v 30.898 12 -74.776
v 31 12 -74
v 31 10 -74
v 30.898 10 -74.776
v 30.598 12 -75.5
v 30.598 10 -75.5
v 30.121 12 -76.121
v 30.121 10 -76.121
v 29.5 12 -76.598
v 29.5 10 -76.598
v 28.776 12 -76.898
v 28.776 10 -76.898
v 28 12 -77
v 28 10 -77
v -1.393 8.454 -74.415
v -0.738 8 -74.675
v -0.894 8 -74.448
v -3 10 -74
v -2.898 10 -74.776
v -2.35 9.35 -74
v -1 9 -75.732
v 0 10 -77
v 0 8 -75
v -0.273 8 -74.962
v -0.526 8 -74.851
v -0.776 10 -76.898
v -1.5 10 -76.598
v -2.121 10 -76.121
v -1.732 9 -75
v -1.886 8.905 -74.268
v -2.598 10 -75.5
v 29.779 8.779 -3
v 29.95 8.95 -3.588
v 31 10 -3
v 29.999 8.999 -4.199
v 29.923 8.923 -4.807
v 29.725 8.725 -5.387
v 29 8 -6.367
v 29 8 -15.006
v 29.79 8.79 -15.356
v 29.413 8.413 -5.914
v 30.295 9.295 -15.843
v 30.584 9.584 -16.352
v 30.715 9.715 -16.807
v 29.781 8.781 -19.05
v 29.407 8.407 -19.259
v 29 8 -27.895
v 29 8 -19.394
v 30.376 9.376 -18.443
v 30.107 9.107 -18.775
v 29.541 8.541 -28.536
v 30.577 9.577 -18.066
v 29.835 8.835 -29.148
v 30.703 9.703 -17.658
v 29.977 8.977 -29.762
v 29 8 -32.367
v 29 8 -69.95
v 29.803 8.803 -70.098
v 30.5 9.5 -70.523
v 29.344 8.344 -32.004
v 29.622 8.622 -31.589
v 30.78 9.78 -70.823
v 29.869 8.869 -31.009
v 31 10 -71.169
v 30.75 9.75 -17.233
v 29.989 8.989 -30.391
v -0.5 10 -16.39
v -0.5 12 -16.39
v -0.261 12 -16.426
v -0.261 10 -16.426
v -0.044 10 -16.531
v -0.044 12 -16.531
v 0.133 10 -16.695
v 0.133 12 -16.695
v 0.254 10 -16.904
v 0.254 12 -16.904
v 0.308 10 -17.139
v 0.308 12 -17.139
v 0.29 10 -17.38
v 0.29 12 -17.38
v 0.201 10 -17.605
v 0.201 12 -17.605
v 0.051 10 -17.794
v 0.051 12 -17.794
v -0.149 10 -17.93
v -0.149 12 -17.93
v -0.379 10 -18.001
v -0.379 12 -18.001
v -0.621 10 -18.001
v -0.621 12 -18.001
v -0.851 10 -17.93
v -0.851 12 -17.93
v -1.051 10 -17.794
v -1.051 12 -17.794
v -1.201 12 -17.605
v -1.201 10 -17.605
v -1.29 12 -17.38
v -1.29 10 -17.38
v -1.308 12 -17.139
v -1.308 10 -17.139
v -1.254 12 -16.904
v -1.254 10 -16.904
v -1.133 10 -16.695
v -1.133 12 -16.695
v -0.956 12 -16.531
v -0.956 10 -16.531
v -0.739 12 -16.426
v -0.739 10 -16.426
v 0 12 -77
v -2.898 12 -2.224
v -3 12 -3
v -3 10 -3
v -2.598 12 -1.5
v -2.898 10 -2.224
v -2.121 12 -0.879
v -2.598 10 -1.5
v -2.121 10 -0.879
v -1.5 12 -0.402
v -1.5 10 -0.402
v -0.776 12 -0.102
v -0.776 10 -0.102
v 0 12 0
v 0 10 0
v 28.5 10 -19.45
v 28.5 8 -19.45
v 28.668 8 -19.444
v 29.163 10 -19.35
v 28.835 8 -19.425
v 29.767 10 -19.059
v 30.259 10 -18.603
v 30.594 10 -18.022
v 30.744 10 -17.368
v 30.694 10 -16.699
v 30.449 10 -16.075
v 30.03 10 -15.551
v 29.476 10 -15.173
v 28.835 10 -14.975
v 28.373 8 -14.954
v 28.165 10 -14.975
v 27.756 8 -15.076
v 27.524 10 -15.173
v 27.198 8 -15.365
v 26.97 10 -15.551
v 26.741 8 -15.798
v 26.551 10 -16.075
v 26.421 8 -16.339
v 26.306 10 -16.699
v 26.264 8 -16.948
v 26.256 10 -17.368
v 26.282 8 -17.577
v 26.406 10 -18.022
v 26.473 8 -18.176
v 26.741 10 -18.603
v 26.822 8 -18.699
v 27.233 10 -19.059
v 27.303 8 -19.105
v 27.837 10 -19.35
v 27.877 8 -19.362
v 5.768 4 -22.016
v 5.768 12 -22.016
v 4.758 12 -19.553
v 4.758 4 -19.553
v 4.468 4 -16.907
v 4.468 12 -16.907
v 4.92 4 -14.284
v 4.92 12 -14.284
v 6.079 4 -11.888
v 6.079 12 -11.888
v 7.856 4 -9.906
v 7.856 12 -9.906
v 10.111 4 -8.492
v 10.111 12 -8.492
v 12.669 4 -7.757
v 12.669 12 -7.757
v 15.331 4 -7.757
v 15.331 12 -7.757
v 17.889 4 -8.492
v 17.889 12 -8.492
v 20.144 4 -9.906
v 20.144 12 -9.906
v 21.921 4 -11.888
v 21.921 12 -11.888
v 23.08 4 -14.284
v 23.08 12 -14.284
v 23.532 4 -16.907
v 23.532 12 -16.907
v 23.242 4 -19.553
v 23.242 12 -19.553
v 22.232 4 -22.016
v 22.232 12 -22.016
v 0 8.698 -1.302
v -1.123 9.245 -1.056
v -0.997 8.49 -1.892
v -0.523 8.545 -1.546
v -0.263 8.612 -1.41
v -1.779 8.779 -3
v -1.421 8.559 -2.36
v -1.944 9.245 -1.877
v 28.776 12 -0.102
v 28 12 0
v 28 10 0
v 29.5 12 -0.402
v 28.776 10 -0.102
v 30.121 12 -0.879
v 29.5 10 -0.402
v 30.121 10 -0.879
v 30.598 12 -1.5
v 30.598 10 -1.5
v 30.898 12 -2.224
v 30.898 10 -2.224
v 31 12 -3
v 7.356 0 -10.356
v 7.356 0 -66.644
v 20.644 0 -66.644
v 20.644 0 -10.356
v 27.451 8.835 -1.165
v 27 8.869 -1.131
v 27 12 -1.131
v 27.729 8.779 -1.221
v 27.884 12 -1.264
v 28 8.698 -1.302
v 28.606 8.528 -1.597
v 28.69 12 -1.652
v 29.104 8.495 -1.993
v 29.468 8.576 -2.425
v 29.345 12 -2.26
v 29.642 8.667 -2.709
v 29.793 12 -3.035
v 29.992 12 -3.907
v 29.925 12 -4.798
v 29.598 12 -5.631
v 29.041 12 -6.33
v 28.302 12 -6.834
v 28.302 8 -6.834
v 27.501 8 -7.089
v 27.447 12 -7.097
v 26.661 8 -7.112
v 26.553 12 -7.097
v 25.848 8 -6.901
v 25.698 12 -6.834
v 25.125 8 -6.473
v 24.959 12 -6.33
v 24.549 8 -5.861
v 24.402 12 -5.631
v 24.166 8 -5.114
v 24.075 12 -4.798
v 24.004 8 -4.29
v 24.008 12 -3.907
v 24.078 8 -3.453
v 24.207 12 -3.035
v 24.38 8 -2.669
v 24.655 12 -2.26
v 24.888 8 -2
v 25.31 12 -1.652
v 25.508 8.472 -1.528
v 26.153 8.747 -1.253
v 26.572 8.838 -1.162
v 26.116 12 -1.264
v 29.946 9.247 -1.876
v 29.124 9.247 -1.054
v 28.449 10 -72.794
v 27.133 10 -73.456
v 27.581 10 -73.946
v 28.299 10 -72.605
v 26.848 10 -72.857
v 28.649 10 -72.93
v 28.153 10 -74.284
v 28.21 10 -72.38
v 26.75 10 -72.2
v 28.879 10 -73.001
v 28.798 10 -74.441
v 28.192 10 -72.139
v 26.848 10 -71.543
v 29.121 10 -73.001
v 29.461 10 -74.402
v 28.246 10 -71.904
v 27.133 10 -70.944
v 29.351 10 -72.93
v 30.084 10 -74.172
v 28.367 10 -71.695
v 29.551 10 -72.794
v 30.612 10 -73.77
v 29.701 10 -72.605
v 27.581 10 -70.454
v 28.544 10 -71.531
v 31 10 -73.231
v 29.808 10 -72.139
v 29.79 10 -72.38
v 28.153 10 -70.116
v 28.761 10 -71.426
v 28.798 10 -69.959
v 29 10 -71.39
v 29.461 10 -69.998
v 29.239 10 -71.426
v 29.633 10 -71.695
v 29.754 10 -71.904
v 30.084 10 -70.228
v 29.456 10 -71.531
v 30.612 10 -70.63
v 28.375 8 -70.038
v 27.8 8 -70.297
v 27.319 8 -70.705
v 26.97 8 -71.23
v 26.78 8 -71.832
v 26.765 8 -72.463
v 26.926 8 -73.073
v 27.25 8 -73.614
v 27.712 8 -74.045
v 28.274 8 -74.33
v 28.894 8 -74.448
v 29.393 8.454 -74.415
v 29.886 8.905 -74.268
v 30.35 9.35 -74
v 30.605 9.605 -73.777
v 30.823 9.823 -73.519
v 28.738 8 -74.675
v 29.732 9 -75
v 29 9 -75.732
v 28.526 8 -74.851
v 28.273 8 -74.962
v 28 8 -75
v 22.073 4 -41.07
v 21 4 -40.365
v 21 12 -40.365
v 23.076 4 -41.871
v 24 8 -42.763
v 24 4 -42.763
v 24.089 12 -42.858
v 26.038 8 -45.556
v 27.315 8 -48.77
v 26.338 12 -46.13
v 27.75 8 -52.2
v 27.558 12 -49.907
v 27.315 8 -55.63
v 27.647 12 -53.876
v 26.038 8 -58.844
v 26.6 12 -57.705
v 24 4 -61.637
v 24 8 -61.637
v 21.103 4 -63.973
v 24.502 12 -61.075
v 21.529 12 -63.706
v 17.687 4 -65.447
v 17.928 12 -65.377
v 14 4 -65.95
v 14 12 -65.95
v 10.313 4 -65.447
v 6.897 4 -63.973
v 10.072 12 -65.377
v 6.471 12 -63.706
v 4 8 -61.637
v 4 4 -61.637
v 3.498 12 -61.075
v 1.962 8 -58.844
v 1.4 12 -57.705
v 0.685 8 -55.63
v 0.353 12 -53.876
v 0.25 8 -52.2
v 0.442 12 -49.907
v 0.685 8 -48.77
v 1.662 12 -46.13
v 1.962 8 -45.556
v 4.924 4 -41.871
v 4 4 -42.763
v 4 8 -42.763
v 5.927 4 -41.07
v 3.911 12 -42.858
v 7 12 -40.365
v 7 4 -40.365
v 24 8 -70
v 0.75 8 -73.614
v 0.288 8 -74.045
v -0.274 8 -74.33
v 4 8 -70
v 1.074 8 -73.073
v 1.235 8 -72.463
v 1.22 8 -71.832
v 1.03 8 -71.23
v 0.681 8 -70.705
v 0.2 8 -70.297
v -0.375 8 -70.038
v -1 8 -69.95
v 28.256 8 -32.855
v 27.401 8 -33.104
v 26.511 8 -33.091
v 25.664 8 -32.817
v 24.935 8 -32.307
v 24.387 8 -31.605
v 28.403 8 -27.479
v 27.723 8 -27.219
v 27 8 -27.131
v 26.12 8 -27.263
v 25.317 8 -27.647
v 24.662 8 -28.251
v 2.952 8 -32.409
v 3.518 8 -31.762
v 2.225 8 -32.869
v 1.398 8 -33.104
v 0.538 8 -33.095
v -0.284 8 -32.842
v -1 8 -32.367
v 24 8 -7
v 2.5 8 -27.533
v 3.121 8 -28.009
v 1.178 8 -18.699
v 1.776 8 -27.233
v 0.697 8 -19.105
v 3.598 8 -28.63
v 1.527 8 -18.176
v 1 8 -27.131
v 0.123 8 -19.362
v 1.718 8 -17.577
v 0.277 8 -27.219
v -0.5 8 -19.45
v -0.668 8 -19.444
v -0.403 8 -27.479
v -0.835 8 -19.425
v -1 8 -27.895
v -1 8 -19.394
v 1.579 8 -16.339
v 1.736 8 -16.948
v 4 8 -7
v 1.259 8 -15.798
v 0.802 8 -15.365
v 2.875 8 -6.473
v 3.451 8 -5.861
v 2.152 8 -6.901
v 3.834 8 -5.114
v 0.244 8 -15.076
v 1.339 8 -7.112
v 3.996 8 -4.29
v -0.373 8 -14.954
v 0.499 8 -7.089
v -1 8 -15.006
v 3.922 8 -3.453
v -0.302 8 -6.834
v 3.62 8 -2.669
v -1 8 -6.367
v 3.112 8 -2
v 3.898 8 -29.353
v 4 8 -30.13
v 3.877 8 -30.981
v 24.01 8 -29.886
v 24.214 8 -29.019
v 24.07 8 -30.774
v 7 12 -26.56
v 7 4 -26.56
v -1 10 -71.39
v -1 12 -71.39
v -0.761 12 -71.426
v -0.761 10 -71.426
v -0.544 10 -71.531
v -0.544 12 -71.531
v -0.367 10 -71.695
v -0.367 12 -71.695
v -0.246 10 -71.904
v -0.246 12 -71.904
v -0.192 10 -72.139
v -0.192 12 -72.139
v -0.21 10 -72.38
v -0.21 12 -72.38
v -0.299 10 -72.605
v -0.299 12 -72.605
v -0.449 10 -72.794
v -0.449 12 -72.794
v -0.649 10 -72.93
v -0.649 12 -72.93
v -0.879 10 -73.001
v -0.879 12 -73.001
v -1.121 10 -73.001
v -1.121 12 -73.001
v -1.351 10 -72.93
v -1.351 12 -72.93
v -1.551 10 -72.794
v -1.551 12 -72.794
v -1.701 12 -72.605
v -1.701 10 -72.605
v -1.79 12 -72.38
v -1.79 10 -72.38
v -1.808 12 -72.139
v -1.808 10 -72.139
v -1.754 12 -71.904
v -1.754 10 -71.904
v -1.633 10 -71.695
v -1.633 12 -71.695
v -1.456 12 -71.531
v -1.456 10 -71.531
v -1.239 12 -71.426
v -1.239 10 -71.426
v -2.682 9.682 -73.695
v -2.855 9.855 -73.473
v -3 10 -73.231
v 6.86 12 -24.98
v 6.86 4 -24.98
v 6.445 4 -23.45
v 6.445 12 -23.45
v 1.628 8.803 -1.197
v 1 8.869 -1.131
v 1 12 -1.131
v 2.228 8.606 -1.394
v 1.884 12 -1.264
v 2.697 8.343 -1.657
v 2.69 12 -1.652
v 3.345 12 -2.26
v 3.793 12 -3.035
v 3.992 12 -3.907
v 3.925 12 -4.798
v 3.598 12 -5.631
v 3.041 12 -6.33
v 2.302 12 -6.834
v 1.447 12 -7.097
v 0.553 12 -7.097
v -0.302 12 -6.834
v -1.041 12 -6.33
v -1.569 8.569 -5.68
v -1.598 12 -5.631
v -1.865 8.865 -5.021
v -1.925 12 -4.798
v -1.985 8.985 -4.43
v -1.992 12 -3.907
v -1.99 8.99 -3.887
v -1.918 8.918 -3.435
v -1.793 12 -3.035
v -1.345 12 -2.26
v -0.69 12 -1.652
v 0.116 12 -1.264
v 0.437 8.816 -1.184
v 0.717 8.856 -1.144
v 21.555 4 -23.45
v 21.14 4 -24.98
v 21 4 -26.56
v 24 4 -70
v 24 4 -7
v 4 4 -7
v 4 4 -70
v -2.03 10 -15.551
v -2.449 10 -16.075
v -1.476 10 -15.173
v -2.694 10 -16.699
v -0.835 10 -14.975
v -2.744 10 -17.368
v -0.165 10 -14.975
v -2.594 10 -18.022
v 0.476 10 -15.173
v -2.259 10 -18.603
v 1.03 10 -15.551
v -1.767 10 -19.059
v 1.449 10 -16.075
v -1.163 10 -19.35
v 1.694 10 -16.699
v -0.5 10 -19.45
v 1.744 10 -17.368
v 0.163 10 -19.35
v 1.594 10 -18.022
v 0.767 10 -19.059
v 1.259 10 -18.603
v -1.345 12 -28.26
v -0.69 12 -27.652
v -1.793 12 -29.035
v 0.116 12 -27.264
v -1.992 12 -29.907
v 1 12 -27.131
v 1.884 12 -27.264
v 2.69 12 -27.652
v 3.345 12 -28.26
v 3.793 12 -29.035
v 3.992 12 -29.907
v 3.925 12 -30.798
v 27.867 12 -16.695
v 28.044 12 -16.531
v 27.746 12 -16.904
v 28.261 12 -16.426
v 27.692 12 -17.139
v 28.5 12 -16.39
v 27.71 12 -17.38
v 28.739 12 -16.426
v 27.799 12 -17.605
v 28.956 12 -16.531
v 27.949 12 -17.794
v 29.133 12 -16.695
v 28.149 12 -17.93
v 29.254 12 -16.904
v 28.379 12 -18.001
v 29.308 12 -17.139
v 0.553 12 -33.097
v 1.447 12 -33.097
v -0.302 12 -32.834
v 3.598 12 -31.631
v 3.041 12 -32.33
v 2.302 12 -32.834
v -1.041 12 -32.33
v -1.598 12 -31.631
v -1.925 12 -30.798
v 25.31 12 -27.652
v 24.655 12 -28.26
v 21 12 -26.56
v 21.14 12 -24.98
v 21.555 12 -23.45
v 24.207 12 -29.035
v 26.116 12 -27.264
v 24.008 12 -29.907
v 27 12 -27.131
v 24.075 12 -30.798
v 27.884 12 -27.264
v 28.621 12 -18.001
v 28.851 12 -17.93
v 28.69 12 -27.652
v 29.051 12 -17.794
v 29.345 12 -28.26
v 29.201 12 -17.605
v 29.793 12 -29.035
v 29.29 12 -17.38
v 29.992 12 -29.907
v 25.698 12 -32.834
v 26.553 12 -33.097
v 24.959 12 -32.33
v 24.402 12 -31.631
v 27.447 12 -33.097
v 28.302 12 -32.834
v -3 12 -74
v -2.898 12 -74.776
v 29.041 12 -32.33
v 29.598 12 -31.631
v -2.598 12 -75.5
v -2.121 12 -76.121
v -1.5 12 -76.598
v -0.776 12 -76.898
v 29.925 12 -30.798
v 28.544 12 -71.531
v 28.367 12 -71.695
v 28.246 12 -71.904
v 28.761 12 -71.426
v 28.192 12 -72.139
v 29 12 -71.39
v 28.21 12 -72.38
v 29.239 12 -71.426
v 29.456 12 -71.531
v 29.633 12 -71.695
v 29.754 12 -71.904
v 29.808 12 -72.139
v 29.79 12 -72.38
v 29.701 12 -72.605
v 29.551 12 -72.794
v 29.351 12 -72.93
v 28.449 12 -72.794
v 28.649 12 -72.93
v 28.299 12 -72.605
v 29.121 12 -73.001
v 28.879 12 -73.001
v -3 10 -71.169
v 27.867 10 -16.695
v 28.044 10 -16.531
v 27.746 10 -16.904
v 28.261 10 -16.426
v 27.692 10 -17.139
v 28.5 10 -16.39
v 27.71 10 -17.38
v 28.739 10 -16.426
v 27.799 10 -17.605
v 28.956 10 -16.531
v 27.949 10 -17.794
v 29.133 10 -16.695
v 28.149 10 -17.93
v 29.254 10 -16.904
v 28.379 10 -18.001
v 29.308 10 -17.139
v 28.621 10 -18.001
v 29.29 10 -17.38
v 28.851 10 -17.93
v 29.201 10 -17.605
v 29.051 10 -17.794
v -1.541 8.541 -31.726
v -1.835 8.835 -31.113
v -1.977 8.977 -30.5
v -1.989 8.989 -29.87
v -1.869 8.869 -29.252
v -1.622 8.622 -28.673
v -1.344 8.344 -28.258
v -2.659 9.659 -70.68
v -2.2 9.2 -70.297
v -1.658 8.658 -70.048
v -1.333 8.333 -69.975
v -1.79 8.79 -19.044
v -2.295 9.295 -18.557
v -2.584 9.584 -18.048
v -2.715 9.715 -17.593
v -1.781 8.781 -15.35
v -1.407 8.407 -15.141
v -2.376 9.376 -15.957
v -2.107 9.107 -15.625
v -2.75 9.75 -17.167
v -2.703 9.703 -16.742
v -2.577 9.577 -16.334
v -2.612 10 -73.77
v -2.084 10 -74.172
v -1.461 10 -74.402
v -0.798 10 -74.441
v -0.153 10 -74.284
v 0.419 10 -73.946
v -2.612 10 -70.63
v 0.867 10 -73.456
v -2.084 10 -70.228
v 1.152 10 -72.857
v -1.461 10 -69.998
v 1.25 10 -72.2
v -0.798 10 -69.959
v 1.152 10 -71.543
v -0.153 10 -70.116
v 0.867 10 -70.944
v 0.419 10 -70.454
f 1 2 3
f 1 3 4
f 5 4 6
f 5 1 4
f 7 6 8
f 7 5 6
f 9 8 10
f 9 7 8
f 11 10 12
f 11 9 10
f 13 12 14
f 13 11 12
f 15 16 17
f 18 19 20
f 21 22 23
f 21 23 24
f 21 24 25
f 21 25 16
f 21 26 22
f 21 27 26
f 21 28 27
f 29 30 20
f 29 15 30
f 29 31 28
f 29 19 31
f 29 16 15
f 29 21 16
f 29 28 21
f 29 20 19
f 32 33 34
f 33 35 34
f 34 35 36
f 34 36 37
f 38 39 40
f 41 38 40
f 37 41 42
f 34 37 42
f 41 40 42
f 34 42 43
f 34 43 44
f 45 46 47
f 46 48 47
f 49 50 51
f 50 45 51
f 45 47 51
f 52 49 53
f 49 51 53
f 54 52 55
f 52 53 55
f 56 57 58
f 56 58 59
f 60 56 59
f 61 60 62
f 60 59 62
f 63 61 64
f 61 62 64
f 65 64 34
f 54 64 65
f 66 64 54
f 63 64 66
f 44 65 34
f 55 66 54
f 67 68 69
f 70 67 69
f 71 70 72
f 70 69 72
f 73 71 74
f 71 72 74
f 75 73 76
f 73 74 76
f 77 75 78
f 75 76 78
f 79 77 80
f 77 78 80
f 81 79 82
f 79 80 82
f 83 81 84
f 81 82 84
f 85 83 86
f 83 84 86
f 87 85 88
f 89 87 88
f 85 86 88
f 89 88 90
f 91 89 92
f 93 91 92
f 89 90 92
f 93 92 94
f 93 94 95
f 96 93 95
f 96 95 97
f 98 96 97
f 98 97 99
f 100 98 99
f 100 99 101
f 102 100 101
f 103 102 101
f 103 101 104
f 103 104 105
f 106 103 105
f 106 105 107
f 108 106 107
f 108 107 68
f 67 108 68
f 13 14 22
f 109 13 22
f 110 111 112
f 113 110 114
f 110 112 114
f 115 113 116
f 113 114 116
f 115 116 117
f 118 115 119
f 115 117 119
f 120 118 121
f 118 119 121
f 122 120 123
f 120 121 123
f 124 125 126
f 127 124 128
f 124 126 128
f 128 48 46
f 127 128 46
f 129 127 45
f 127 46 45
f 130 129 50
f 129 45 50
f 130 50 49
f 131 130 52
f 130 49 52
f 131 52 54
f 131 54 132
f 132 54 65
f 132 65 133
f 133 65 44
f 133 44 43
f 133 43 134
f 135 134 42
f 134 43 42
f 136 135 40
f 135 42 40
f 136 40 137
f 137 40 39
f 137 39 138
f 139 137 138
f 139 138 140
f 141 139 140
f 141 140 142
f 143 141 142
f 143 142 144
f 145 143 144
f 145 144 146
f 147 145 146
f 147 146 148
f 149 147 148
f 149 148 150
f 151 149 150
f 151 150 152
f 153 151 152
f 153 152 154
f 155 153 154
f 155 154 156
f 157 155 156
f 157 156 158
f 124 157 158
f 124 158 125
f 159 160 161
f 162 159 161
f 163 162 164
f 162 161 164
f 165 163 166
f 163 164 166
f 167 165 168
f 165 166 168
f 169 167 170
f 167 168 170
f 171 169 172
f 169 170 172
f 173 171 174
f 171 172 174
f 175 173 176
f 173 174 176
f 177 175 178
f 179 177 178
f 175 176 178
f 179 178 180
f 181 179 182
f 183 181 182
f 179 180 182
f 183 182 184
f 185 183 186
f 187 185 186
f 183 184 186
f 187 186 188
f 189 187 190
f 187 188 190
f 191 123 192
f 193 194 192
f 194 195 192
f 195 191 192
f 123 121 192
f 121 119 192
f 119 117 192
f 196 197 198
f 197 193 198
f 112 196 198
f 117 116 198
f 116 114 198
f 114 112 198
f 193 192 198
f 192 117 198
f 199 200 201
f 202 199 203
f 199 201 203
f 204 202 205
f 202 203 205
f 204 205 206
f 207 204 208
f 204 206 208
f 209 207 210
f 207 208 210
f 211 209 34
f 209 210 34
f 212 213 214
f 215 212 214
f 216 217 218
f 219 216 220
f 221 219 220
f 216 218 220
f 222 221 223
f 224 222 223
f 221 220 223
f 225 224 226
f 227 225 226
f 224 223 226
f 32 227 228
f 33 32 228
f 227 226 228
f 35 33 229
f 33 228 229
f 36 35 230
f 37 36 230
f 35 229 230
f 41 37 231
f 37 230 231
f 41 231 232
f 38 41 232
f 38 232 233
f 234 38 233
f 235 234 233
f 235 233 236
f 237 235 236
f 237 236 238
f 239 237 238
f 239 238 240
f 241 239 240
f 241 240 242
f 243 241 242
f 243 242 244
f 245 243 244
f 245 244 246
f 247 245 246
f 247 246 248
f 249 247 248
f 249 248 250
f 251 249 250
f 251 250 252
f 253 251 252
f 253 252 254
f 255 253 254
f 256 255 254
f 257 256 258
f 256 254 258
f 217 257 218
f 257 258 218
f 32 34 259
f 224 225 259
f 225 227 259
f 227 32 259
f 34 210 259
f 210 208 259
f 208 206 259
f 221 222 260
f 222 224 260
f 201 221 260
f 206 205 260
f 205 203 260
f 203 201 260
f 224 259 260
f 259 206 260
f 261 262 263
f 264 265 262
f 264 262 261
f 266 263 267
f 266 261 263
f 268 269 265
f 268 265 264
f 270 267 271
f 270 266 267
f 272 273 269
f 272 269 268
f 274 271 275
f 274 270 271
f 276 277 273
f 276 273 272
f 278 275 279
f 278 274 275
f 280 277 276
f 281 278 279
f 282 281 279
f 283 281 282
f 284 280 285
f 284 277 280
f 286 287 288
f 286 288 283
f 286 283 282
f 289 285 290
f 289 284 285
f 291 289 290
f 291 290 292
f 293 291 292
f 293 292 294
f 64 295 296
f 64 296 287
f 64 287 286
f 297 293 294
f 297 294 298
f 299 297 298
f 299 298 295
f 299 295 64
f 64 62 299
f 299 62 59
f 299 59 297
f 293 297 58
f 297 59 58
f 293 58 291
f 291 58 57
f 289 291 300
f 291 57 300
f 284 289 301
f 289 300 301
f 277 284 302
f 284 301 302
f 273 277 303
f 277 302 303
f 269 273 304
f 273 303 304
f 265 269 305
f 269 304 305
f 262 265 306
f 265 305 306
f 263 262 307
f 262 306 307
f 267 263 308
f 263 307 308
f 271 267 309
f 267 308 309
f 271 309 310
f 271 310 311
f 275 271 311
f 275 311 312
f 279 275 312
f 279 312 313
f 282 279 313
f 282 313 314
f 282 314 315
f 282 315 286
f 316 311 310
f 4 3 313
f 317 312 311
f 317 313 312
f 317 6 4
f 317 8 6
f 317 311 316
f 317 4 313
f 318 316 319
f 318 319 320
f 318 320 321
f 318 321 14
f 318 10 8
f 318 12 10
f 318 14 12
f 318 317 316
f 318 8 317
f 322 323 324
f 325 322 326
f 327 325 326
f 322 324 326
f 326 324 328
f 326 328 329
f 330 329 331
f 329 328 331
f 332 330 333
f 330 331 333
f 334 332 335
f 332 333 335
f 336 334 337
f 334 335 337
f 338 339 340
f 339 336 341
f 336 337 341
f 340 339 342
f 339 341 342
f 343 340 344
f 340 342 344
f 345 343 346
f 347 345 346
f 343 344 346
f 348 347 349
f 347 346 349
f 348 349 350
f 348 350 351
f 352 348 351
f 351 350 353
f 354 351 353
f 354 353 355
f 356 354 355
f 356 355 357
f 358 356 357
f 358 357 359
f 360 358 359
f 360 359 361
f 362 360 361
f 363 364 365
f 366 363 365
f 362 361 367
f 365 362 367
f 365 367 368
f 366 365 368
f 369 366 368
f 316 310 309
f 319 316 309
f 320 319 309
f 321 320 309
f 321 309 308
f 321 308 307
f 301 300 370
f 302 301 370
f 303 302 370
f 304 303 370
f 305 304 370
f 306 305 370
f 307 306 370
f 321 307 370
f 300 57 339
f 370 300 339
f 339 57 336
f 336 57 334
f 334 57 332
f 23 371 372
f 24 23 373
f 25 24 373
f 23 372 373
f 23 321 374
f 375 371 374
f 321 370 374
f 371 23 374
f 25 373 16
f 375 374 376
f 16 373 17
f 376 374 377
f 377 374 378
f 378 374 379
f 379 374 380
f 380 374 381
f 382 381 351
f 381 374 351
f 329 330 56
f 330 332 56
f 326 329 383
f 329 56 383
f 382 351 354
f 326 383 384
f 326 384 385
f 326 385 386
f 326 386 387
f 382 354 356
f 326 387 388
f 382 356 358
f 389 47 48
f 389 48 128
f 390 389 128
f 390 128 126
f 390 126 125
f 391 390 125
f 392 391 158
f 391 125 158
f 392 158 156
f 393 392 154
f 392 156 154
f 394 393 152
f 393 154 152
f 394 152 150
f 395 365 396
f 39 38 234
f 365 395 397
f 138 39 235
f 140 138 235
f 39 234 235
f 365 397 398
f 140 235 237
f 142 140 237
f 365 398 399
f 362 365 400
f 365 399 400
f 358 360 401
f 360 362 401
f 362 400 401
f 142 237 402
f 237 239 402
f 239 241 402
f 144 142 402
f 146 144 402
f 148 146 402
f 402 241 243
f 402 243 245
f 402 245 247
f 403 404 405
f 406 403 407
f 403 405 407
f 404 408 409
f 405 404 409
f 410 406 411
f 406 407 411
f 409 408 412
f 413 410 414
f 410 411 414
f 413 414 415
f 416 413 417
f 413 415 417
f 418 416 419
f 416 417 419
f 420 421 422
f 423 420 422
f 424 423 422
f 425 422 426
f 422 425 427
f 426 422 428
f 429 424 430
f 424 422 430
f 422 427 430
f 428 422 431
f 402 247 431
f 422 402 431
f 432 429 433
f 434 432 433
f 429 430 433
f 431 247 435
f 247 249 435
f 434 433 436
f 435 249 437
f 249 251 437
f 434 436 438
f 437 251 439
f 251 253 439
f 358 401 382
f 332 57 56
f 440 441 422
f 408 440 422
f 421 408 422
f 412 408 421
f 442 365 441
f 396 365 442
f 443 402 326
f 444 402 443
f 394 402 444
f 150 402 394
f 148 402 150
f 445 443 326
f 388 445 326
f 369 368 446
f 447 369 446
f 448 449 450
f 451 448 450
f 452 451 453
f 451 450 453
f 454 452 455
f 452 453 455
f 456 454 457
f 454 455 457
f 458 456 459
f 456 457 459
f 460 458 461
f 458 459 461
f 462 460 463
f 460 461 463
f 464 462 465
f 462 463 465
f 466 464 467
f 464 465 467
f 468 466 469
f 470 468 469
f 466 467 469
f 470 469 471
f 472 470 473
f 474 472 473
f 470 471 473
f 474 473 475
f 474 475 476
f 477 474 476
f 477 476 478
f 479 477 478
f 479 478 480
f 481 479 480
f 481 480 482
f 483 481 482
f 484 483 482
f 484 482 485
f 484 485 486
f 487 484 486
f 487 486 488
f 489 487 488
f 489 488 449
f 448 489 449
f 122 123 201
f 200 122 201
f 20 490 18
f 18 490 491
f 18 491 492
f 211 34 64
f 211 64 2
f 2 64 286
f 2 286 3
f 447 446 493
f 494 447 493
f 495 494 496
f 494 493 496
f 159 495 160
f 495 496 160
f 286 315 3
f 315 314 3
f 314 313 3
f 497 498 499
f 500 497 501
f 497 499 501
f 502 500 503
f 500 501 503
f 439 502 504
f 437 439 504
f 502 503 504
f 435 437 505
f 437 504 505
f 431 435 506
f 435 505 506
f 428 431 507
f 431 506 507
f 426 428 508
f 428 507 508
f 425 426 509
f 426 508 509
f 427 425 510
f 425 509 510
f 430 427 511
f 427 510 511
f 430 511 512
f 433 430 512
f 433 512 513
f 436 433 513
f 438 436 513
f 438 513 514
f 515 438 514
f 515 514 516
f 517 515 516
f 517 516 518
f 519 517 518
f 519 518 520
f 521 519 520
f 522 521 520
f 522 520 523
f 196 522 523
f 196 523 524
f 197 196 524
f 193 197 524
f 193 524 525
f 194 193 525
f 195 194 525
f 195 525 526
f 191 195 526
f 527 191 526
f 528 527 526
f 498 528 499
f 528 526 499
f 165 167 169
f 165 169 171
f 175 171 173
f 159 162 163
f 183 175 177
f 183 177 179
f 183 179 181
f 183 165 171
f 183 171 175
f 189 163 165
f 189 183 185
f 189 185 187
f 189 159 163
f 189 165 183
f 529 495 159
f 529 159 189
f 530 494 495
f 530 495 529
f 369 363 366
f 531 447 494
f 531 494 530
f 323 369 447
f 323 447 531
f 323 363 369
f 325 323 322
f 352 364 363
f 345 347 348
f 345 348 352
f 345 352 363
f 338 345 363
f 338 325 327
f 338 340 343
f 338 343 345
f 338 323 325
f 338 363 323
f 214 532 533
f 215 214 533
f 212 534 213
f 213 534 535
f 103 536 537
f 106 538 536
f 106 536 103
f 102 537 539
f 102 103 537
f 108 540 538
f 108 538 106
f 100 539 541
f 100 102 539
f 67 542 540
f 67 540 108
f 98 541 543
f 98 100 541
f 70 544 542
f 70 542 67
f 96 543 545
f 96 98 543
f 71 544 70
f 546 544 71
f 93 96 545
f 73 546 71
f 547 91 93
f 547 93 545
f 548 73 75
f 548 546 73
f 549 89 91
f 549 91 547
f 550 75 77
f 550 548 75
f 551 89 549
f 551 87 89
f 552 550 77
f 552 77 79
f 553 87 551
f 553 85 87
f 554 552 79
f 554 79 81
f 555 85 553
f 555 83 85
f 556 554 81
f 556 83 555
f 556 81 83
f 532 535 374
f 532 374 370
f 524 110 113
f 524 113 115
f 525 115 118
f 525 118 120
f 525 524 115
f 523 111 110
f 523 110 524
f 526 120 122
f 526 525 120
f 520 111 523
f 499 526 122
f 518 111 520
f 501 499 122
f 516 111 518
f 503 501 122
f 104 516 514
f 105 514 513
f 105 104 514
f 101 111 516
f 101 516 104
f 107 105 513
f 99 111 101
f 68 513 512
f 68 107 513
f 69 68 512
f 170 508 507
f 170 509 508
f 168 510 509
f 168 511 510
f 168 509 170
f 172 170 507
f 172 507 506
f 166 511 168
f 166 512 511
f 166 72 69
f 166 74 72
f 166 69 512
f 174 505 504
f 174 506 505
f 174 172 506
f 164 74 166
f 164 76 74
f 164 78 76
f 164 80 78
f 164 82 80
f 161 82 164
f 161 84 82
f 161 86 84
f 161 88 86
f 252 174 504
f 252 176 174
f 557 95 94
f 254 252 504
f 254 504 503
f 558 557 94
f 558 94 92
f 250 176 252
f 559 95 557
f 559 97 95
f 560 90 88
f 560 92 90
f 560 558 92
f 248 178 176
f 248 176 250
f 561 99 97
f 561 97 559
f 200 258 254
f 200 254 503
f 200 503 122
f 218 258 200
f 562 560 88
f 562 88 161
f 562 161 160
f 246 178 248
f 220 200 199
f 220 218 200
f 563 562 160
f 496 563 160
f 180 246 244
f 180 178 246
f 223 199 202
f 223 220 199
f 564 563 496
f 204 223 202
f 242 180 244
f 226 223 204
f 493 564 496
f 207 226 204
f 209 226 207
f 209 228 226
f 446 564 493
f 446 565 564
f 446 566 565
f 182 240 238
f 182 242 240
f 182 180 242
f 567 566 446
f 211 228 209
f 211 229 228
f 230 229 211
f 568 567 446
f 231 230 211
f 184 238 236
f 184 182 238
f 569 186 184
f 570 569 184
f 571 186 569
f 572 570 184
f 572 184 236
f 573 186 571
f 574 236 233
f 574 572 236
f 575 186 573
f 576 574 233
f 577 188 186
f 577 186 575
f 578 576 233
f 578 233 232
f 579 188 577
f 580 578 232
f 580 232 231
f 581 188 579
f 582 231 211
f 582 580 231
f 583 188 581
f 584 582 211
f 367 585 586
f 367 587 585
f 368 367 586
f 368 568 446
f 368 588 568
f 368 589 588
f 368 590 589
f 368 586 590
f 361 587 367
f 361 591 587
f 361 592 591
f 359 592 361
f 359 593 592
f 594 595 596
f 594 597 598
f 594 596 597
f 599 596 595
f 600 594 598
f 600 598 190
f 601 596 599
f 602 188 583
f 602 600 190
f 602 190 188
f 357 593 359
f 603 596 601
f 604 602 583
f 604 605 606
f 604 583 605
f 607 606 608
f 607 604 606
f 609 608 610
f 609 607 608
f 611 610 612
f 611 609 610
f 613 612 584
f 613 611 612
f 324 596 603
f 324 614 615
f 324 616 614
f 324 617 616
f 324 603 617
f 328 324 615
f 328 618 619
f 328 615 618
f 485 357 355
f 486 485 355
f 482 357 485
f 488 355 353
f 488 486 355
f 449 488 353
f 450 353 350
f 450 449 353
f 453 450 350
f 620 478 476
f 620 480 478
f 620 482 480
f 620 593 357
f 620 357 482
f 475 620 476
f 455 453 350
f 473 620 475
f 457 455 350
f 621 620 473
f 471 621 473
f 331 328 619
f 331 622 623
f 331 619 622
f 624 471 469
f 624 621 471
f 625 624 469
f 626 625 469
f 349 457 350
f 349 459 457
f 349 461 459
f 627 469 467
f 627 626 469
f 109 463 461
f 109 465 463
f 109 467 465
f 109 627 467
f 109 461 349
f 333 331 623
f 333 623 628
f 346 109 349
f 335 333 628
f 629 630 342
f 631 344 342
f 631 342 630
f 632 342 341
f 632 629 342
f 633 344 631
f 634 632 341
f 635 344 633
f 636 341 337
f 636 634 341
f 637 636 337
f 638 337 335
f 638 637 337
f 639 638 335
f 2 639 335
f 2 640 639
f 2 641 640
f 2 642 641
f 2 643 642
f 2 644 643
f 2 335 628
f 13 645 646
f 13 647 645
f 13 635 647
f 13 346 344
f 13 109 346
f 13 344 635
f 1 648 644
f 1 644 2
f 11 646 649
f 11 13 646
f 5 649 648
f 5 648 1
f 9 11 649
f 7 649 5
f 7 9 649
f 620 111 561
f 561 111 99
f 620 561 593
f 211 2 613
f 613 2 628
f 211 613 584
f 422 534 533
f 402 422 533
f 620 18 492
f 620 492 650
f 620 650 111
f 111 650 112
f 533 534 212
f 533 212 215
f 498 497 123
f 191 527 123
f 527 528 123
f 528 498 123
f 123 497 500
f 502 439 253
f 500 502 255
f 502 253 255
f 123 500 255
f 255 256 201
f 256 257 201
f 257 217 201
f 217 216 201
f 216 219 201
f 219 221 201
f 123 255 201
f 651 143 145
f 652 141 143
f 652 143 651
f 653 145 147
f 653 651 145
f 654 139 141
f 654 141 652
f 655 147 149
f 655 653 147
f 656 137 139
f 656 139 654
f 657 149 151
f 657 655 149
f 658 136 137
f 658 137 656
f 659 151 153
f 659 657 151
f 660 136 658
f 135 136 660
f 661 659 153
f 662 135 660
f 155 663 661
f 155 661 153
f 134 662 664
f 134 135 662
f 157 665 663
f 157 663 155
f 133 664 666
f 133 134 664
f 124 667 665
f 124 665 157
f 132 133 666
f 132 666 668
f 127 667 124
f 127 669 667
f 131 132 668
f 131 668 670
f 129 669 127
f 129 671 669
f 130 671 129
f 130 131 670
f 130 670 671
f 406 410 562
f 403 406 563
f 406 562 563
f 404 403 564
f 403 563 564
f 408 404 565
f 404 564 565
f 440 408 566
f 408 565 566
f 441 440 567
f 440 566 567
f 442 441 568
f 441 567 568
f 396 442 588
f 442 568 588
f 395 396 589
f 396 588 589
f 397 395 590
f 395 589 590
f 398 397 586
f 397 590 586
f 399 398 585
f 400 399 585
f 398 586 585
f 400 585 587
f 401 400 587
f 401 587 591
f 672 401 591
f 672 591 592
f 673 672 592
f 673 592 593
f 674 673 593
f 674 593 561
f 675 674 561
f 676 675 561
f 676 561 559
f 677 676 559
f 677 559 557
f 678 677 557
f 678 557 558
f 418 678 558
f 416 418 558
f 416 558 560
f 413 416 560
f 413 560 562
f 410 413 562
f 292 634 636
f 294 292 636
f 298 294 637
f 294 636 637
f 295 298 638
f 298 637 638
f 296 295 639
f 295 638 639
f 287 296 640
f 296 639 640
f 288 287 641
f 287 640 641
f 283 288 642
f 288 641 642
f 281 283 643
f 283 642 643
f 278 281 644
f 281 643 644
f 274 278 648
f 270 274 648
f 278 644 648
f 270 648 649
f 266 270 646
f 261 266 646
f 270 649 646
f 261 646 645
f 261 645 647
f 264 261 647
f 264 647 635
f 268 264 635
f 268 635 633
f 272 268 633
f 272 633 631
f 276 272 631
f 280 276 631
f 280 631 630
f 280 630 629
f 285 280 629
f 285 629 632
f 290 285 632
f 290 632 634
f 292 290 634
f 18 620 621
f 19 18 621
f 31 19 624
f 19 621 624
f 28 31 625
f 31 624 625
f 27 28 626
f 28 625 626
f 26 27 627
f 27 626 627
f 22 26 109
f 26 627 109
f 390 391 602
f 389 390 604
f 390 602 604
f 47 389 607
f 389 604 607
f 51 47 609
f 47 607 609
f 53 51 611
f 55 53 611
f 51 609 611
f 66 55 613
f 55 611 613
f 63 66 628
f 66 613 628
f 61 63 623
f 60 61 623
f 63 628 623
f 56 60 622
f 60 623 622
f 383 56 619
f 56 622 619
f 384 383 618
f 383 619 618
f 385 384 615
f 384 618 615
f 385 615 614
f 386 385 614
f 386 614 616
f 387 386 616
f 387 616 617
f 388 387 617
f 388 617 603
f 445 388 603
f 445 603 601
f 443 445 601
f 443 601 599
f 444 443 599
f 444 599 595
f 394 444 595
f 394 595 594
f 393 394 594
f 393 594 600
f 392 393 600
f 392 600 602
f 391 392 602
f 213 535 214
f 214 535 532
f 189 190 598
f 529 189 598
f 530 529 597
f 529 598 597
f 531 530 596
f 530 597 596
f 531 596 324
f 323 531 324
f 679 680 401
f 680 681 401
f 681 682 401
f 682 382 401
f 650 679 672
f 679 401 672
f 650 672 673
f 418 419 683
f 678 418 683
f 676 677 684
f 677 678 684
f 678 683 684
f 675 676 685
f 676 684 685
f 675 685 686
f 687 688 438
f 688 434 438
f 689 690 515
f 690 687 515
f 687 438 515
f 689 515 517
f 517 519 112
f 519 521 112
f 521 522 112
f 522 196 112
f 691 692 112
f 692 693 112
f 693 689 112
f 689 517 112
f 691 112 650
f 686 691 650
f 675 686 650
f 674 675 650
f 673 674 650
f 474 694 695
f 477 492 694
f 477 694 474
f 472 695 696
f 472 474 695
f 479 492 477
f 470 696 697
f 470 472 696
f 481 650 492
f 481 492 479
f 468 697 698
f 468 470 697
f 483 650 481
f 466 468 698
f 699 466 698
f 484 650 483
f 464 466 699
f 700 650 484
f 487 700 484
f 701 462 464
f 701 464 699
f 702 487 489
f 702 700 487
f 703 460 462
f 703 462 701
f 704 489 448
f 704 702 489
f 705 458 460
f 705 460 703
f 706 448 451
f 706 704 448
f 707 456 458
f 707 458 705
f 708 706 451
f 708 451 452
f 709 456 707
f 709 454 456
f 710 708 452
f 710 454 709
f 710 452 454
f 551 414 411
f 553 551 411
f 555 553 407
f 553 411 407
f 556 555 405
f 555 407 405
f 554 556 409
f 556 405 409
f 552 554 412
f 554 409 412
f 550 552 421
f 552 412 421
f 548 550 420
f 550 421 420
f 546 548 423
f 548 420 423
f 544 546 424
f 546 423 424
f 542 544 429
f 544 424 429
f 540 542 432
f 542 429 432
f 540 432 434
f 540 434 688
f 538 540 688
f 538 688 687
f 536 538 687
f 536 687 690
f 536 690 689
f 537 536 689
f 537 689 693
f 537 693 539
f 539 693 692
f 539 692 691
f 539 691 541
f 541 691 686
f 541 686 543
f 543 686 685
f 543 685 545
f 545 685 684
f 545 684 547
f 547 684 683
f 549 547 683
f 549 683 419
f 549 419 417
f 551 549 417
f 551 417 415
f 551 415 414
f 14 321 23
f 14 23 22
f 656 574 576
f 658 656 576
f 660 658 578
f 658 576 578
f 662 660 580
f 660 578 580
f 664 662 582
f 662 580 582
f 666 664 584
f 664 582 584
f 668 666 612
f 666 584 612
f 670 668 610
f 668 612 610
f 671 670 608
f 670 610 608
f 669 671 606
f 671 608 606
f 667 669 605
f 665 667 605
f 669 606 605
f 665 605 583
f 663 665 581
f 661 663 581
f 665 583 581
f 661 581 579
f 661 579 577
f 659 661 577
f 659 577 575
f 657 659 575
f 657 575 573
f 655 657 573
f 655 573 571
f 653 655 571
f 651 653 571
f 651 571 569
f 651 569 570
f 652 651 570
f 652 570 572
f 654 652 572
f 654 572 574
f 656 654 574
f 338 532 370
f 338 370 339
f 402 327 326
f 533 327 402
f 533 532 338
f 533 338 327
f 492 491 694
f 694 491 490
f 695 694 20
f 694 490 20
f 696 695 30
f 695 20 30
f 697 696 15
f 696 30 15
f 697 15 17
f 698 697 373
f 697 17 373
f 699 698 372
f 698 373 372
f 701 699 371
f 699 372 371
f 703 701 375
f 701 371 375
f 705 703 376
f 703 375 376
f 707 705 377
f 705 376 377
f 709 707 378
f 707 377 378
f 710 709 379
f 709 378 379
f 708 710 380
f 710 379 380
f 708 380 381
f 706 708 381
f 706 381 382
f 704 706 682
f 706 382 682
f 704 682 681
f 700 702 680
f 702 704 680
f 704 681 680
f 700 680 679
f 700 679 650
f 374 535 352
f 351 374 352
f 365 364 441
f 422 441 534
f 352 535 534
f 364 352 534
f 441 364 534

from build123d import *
from OCP.BRepFilletAPI import BRepFilletAPI_MakeChamfer

# Parameters (mm, degrees)
EXTRUDE_1_DEPTH     = 12
SKETCH_2_R          = 3
SKETCH_2_R_2        = 0.81
CUT_EXTRUDE_1_DEPTH = 12
CUT_EXTRUDE_2_DEPTH = 8
FILLET_1_R          = 3
SKETCH_4_R          = 2.25
CUT_EXTRUDE_3_DEPTH = 10
SKETCH_5_W          = 20
SKETCH_5_H          = 63
CUT_EXTRUDE_4_DEPTH = 8
CHAMFER_4_SIZE      = 3.356398525
CHAMFER_4_SIZE_2    = 4
CHAMFER_5_SIZE      = 2


# Some blends are built 0.0001 mm under size
with BuildPart() as part:
    # 草图1 → 凸台-拉伸1 (new body)
    with BuildSketch(Plane(origin=(0, 0, 0), x_dir=(1, 0, 0), z_dir=(0, 1, 0))):
        with BuildLine():
            Line((0, 0), (28, 0))
            ThreePointArc((28, 0), (30.121320344, 0.878679656), (31, 3))
            Line((31, 3), (31, 77))
            Line((31, 77), (-3, 77))
            Line((-3, 77), (-3, 3))
            ThreePointArc((-3, 3), (-2.121320344, 0.878679656), (0, 0))
        make_face()
    extrude(amount=EXTRUDE_1_DEPTH)

    # 草图2 → 切除-拉伸1 (cut)
    with BuildSketch(Plane(origin=(14.000000253, 12, -382.2), x_dir=(1, 0, 0), z_dir=(0, 1, 0))):
        with Locations(Location((13, -352.069110398, 0), (0, 0, 270))):
            Circle(SKETCH_2_R)
        with Locations(Location((-13, -352.069110398, 0), (0, 0, 270))):
            Circle(SKETCH_2_R)
        with Locations(Location((13, -378.069110398, 0), (0, 0, 270))):
            Circle(SKETCH_2_R)
        with Locations(Location((-13, -378.069110398, 0), (0, 0, 270))):
            Circle(SKETCH_2_R)
        with Locations(Location((-15.000000143, -309.999984702, 0), (0, 0, 270))):
            Circle(SKETCH_2_R_2)
        with Locations(Location((15.000000143, -309.999984702, 0), (0, 0, 270))):
            Circle(SKETCH_2_R_2)
        with Locations(Location((14.500000253, -365.000006616, 0), (0, 0, 270))):
            Circle(SKETCH_2_R_2)
        with Locations(Location((-14.500000253, -365.000006616, 0), (0, 0, 270))):
            Circle(SKETCH_2_R_2)
    extrude(amount=-CUT_EXTRUDE_1_DEPTH, mode=Mode.SUBTRACT)

    # 草图3 → 切除-拉伸2 (cut)
    with BuildSketch(Plane(origin=(14.000000253, 12, -382.2), x_dir=(1, 0, 0), z_dir=(0, 1, 0))):
        with BuildLine():
            Line((-7.000000134, -341.834781862), (-7.000000134, -355.639881164))
            ThreePointArc((-7.000000134, -355.639881164), (-7.313370109, -357.994123887), (-8.231657645, -360.184422392))
            ThreePointArc((-8.231657645, -360.184422392), (0, -374.536779603), (8.231657645, -360.184422392))
            ThreePointArc((8.231657645, -360.184422392), (7.313370109, -357.994123887), (7.000000134, -355.639881164))
            Line((7.000000134, -355.639881164), (7.000000134, -341.834782031))
            ThreePointArc((7.000000134, -341.834782031), (3.09e-07, -316.249981647), (-7.000000134, -341.834781862))
        make_face()
    extrude(amount=-CUT_EXTRUDE_2_DEPTH, mode=Mode.SUBTRACT)

    # 圆角1
    fillet_1_edges = [part.edges().sort_by_distance(p)[0] for p in [
        (-3, 6, -77),
        (31, 6, -77),
    ]]
    fillet(fillet_1_edges, radius=FILLET_1_R)

    # 草图4 → 切除-拉伸3 (cut)
    with BuildSketch(Plane.XZ):
        with Locations(Location((-0.5, -17.199993384, 0), (0, 0, 270))):
            Circle(SKETCH_4_R)
        with Locations(Location((28.500000507, -17.199993384, 0), (0, 0, 270))):
            Circle(SKETCH_4_R)
        with Locations((-0.99999989, -72.200015298)):
            Circle(SKETCH_4_R)
        with Locations((29.000000396, -72.200015298)):
            Circle(SKETCH_4_R)
    extrude(amount=-CUT_EXTRUDE_3_DEPTH, mode=Mode.SUBTRACT)

    # 草图5 → 切除-拉伸4 (cut)
    with BuildSketch(Plane.XZ):
        Polygon((28, -77), (0, -77), (-3, -77), (-3, -71.169239105), (-3, -3), (-3, 0), (0, 0), (28, 0), (31, 0), (31, -3), (31, -71.169238122), (31, -77), align=None)
        with Locations((14, -38.5)):
            Rectangle(SKETCH_5_W, SKETCH_5_H, mode=Mode.SUBTRACT)
    extrude(amount=-CUT_EXTRUDE_4_DEPTH, mode=Mode.SUBTRACT)

    # 倒角4
    chamfer_4_edges_1 = [part.edges().sort_by_distance(p)[0] for p in [
        (24, 0, -38.5),
    ]]
    chamfer_4_side_1 = [part.faces().sort_by_distance(p)[0] for p in [
        (23.93287203, 0, -38.5),
    ]]
    chamfer_4_edges_2 = [part.edges().sort_by_distance(p)[0] for p in [
        (4, 0, -38.5),
    ]]
    chamfer_4_side_2 = [part.faces().sort_by_distance(p)[0] for p in [
        (4.06712797, 0, -38.5),
    ]]
    chamfer_4_edges_3 = [part.edges().sort_by_distance(p)[0] for p in [
        (14, 0, -7),
    ]]
    chamfer_4_side_3 = [part.faces().sort_by_distance(p)[0] for p in [
        (14, 0, -7.06712797),
    ]]
    chamfer_4_edges_4 = [part.edges().sort_by_distance(p)[0] for p in [
        (14, 0, -70),
    ]]
    chamfer_4_side_4 = [part.faces().sort_by_distance(p)[0] for p in [
        (14, 0, -69.93287203),
    ]]
    chamfer_4 = BRepFilletAPI_MakeChamfer(part.part.solid().wrapped)
    for e in chamfer_4_edges_1:
        chamfer_4.Add(CHAMFER_4_SIZE - 0.0001, CHAMFER_4_SIZE_2 - 0.0001, e.wrapped, chamfer_4_side_1[0].wrapped)
    for e in chamfer_4_edges_2:
        chamfer_4.Add(CHAMFER_4_SIZE - 0.0001, CHAMFER_4_SIZE_2 - 0.0001, e.wrapped, chamfer_4_side_2[0].wrapped)
    for e in chamfer_4_edges_3:
        chamfer_4.Add(CHAMFER_4_SIZE - 0.0001, CHAMFER_4_SIZE_2 - 0.0001, e.wrapped, chamfer_4_side_3[0].wrapped)
    for e in chamfer_4_edges_4:
        chamfer_4.Add(CHAMFER_4_SIZE - 0.0001, CHAMFER_4_SIZE_2 - 0.0001, e.wrapped, chamfer_4_side_4[0].wrapped)
    add(Compound.cast(chamfer_4.Shape()), mode=Mode.REPLACE)  # a hair under: the kernel refuses the full size

    # 倒角5
    # the kernel refuses this chamfer: 2 mm, written as the material it takes off along each edge
    with BuildSketch(Plane(origin=(28, 8, 0), x_dir=(0, -0.027495876610586494, -0.9996219169112968), z_dir=(-1, 0, 0)), Plane(origin=(0, 8, -77), x_dir=(0, -0.027495876610586414, 0.9996219169112968), z_dir=(1, 0, 0))) as chamfer_5_piece_1:
        Polygon((CHAMFER_5_SIZE * 0.999621916911, -CHAMFER_5_SIZE * 0.0274958766106), (-CHAMFER_5_SIZE * 0.0274958766106, -CHAMFER_5_SIZE * 0.999621916911), (0, 0), align=None)
    extrude(amount=28, mode=Mode.SUBTRACT)
    with BuildSketch(Plane(origin=(31, 8, -76.312604098), x_dir=(-0.9996219169112968, -0.02749587661058651, 0), z_dir=(0, 0, 1))) as chamfer_5_piece_2:
        Polygon((CHAMFER_5_SIZE * 0.999621916911, -CHAMFER_5_SIZE * 0.0274958766106), (-CHAMFER_5_SIZE * 0.0274958766106, -CHAMFER_5_SIZE * 0.999621916911), (0, 0), align=None)
    extrude(amount=73.312604098, mode=Mode.SUBTRACT)
    with BuildSketch(Plane(origin=(-3, 8, -68.087425514), x_dir=(0.9996219169112968, -0.027495876610586487, 0), z_dir=(0, 0, -1))) as chamfer_5_piece_3:
        Polygon((CHAMFER_5_SIZE * 0.999621916911, -CHAMFER_5_SIZE * 0.0274958766106), (-CHAMFER_5_SIZE * 0.0274958766106, -CHAMFER_5_SIZE * 0.999621916911), (0, 0), align=None)
    extrude(amount=5.912574486, mode=Mode.SUBTRACT)
    with BuildSketch(Plane(origin=(31, 8, -74), x_dir=(-0.9996219169112968, -0.02749587661058651, 0), z_dir=(0, 0, 1))) as chamfer_5_piece_4:
        Polygon((CHAMFER_5_SIZE * 0.999621916911, -CHAMFER_5_SIZE * 0.0274958766106), (-CHAMFER_5_SIZE * 0.0274958766106, -CHAMFER_5_SIZE * 0.999621916911), (0, 0), align=None)
    extrude(amount=5.912573503, mode=Mode.SUBTRACT)
    with BuildSketch(Plane(origin=(0, 8, -74), x_dir=(0, 0, -1), z_dir=(1, 0, 0))) as chamfer_5_piece_5:
        Polygon((3 - CHAMFER_5_SIZE, 0), (3, CHAMFER_5_SIZE), (3, 0), align=None)
    revolve(axis=Axis((0, 8, -74), (0, 1, 0)), revolution_arc=90, mode=Mode.SUBTRACT)
    with BuildSketch(Plane(origin=(28, 8, -74), x_dir=(1, 0, 0), z_dir=(0, 0, 1))) as chamfer_5_piece_6:
        Polygon((3 - CHAMFER_5_SIZE, 0), (3, CHAMFER_5_SIZE), (3, 0), align=None)
    revolve(axis=Axis((28, 8, -74), (0, 1, 0)), revolution_arc=90, mode=Mode.SUBTRACT)
    with BuildSketch(Plane(origin=(28, 8, -3), x_dir=(1, 0, 0), z_dir=(0, 0, -1))) as chamfer_5_piece_7:
        Polygon((3 - CHAMFER_5_SIZE, 0), (3, -CHAMFER_5_SIZE), (3, 0), align=None)
    revolve(axis=Axis((28, 8, -3), (0, -1, 0)), revolution_arc=90, mode=Mode.SUBTRACT)
    with BuildSketch(Plane(origin=(0, 8, -3), x_dir=(0, 0, 1), z_dir=(1, 0, 0))) as chamfer_5_piece_8:
        Polygon((3 - CHAMFER_5_SIZE, 0), (3, -CHAMFER_5_SIZE), (3, 0), align=None)
    revolve(axis=Axis((0, 8, -3), (0, -1, 0)), revolution_arc=90, mode=Mode.SUBTRACT)
    with BuildSketch(Plane(origin=(-3, 8, -3), x_dir=(0.9996219169112968, -0.027495876610586497, 0), z_dir=(0, 0, -1))) as chamfer_5_piece_9:
        Polygon((CHAMFER_5_SIZE * 0.999621916911, -CHAMFER_5_SIZE * 0.0274958766106), (-CHAMFER_5_SIZE * 0.0274958766106, -CHAMFER_5_SIZE * 0.999621916911), (0, 0), align=None)
    extrude(amount=73.312605081, mode=Mode.SUBTRACT)


solid = part.part
